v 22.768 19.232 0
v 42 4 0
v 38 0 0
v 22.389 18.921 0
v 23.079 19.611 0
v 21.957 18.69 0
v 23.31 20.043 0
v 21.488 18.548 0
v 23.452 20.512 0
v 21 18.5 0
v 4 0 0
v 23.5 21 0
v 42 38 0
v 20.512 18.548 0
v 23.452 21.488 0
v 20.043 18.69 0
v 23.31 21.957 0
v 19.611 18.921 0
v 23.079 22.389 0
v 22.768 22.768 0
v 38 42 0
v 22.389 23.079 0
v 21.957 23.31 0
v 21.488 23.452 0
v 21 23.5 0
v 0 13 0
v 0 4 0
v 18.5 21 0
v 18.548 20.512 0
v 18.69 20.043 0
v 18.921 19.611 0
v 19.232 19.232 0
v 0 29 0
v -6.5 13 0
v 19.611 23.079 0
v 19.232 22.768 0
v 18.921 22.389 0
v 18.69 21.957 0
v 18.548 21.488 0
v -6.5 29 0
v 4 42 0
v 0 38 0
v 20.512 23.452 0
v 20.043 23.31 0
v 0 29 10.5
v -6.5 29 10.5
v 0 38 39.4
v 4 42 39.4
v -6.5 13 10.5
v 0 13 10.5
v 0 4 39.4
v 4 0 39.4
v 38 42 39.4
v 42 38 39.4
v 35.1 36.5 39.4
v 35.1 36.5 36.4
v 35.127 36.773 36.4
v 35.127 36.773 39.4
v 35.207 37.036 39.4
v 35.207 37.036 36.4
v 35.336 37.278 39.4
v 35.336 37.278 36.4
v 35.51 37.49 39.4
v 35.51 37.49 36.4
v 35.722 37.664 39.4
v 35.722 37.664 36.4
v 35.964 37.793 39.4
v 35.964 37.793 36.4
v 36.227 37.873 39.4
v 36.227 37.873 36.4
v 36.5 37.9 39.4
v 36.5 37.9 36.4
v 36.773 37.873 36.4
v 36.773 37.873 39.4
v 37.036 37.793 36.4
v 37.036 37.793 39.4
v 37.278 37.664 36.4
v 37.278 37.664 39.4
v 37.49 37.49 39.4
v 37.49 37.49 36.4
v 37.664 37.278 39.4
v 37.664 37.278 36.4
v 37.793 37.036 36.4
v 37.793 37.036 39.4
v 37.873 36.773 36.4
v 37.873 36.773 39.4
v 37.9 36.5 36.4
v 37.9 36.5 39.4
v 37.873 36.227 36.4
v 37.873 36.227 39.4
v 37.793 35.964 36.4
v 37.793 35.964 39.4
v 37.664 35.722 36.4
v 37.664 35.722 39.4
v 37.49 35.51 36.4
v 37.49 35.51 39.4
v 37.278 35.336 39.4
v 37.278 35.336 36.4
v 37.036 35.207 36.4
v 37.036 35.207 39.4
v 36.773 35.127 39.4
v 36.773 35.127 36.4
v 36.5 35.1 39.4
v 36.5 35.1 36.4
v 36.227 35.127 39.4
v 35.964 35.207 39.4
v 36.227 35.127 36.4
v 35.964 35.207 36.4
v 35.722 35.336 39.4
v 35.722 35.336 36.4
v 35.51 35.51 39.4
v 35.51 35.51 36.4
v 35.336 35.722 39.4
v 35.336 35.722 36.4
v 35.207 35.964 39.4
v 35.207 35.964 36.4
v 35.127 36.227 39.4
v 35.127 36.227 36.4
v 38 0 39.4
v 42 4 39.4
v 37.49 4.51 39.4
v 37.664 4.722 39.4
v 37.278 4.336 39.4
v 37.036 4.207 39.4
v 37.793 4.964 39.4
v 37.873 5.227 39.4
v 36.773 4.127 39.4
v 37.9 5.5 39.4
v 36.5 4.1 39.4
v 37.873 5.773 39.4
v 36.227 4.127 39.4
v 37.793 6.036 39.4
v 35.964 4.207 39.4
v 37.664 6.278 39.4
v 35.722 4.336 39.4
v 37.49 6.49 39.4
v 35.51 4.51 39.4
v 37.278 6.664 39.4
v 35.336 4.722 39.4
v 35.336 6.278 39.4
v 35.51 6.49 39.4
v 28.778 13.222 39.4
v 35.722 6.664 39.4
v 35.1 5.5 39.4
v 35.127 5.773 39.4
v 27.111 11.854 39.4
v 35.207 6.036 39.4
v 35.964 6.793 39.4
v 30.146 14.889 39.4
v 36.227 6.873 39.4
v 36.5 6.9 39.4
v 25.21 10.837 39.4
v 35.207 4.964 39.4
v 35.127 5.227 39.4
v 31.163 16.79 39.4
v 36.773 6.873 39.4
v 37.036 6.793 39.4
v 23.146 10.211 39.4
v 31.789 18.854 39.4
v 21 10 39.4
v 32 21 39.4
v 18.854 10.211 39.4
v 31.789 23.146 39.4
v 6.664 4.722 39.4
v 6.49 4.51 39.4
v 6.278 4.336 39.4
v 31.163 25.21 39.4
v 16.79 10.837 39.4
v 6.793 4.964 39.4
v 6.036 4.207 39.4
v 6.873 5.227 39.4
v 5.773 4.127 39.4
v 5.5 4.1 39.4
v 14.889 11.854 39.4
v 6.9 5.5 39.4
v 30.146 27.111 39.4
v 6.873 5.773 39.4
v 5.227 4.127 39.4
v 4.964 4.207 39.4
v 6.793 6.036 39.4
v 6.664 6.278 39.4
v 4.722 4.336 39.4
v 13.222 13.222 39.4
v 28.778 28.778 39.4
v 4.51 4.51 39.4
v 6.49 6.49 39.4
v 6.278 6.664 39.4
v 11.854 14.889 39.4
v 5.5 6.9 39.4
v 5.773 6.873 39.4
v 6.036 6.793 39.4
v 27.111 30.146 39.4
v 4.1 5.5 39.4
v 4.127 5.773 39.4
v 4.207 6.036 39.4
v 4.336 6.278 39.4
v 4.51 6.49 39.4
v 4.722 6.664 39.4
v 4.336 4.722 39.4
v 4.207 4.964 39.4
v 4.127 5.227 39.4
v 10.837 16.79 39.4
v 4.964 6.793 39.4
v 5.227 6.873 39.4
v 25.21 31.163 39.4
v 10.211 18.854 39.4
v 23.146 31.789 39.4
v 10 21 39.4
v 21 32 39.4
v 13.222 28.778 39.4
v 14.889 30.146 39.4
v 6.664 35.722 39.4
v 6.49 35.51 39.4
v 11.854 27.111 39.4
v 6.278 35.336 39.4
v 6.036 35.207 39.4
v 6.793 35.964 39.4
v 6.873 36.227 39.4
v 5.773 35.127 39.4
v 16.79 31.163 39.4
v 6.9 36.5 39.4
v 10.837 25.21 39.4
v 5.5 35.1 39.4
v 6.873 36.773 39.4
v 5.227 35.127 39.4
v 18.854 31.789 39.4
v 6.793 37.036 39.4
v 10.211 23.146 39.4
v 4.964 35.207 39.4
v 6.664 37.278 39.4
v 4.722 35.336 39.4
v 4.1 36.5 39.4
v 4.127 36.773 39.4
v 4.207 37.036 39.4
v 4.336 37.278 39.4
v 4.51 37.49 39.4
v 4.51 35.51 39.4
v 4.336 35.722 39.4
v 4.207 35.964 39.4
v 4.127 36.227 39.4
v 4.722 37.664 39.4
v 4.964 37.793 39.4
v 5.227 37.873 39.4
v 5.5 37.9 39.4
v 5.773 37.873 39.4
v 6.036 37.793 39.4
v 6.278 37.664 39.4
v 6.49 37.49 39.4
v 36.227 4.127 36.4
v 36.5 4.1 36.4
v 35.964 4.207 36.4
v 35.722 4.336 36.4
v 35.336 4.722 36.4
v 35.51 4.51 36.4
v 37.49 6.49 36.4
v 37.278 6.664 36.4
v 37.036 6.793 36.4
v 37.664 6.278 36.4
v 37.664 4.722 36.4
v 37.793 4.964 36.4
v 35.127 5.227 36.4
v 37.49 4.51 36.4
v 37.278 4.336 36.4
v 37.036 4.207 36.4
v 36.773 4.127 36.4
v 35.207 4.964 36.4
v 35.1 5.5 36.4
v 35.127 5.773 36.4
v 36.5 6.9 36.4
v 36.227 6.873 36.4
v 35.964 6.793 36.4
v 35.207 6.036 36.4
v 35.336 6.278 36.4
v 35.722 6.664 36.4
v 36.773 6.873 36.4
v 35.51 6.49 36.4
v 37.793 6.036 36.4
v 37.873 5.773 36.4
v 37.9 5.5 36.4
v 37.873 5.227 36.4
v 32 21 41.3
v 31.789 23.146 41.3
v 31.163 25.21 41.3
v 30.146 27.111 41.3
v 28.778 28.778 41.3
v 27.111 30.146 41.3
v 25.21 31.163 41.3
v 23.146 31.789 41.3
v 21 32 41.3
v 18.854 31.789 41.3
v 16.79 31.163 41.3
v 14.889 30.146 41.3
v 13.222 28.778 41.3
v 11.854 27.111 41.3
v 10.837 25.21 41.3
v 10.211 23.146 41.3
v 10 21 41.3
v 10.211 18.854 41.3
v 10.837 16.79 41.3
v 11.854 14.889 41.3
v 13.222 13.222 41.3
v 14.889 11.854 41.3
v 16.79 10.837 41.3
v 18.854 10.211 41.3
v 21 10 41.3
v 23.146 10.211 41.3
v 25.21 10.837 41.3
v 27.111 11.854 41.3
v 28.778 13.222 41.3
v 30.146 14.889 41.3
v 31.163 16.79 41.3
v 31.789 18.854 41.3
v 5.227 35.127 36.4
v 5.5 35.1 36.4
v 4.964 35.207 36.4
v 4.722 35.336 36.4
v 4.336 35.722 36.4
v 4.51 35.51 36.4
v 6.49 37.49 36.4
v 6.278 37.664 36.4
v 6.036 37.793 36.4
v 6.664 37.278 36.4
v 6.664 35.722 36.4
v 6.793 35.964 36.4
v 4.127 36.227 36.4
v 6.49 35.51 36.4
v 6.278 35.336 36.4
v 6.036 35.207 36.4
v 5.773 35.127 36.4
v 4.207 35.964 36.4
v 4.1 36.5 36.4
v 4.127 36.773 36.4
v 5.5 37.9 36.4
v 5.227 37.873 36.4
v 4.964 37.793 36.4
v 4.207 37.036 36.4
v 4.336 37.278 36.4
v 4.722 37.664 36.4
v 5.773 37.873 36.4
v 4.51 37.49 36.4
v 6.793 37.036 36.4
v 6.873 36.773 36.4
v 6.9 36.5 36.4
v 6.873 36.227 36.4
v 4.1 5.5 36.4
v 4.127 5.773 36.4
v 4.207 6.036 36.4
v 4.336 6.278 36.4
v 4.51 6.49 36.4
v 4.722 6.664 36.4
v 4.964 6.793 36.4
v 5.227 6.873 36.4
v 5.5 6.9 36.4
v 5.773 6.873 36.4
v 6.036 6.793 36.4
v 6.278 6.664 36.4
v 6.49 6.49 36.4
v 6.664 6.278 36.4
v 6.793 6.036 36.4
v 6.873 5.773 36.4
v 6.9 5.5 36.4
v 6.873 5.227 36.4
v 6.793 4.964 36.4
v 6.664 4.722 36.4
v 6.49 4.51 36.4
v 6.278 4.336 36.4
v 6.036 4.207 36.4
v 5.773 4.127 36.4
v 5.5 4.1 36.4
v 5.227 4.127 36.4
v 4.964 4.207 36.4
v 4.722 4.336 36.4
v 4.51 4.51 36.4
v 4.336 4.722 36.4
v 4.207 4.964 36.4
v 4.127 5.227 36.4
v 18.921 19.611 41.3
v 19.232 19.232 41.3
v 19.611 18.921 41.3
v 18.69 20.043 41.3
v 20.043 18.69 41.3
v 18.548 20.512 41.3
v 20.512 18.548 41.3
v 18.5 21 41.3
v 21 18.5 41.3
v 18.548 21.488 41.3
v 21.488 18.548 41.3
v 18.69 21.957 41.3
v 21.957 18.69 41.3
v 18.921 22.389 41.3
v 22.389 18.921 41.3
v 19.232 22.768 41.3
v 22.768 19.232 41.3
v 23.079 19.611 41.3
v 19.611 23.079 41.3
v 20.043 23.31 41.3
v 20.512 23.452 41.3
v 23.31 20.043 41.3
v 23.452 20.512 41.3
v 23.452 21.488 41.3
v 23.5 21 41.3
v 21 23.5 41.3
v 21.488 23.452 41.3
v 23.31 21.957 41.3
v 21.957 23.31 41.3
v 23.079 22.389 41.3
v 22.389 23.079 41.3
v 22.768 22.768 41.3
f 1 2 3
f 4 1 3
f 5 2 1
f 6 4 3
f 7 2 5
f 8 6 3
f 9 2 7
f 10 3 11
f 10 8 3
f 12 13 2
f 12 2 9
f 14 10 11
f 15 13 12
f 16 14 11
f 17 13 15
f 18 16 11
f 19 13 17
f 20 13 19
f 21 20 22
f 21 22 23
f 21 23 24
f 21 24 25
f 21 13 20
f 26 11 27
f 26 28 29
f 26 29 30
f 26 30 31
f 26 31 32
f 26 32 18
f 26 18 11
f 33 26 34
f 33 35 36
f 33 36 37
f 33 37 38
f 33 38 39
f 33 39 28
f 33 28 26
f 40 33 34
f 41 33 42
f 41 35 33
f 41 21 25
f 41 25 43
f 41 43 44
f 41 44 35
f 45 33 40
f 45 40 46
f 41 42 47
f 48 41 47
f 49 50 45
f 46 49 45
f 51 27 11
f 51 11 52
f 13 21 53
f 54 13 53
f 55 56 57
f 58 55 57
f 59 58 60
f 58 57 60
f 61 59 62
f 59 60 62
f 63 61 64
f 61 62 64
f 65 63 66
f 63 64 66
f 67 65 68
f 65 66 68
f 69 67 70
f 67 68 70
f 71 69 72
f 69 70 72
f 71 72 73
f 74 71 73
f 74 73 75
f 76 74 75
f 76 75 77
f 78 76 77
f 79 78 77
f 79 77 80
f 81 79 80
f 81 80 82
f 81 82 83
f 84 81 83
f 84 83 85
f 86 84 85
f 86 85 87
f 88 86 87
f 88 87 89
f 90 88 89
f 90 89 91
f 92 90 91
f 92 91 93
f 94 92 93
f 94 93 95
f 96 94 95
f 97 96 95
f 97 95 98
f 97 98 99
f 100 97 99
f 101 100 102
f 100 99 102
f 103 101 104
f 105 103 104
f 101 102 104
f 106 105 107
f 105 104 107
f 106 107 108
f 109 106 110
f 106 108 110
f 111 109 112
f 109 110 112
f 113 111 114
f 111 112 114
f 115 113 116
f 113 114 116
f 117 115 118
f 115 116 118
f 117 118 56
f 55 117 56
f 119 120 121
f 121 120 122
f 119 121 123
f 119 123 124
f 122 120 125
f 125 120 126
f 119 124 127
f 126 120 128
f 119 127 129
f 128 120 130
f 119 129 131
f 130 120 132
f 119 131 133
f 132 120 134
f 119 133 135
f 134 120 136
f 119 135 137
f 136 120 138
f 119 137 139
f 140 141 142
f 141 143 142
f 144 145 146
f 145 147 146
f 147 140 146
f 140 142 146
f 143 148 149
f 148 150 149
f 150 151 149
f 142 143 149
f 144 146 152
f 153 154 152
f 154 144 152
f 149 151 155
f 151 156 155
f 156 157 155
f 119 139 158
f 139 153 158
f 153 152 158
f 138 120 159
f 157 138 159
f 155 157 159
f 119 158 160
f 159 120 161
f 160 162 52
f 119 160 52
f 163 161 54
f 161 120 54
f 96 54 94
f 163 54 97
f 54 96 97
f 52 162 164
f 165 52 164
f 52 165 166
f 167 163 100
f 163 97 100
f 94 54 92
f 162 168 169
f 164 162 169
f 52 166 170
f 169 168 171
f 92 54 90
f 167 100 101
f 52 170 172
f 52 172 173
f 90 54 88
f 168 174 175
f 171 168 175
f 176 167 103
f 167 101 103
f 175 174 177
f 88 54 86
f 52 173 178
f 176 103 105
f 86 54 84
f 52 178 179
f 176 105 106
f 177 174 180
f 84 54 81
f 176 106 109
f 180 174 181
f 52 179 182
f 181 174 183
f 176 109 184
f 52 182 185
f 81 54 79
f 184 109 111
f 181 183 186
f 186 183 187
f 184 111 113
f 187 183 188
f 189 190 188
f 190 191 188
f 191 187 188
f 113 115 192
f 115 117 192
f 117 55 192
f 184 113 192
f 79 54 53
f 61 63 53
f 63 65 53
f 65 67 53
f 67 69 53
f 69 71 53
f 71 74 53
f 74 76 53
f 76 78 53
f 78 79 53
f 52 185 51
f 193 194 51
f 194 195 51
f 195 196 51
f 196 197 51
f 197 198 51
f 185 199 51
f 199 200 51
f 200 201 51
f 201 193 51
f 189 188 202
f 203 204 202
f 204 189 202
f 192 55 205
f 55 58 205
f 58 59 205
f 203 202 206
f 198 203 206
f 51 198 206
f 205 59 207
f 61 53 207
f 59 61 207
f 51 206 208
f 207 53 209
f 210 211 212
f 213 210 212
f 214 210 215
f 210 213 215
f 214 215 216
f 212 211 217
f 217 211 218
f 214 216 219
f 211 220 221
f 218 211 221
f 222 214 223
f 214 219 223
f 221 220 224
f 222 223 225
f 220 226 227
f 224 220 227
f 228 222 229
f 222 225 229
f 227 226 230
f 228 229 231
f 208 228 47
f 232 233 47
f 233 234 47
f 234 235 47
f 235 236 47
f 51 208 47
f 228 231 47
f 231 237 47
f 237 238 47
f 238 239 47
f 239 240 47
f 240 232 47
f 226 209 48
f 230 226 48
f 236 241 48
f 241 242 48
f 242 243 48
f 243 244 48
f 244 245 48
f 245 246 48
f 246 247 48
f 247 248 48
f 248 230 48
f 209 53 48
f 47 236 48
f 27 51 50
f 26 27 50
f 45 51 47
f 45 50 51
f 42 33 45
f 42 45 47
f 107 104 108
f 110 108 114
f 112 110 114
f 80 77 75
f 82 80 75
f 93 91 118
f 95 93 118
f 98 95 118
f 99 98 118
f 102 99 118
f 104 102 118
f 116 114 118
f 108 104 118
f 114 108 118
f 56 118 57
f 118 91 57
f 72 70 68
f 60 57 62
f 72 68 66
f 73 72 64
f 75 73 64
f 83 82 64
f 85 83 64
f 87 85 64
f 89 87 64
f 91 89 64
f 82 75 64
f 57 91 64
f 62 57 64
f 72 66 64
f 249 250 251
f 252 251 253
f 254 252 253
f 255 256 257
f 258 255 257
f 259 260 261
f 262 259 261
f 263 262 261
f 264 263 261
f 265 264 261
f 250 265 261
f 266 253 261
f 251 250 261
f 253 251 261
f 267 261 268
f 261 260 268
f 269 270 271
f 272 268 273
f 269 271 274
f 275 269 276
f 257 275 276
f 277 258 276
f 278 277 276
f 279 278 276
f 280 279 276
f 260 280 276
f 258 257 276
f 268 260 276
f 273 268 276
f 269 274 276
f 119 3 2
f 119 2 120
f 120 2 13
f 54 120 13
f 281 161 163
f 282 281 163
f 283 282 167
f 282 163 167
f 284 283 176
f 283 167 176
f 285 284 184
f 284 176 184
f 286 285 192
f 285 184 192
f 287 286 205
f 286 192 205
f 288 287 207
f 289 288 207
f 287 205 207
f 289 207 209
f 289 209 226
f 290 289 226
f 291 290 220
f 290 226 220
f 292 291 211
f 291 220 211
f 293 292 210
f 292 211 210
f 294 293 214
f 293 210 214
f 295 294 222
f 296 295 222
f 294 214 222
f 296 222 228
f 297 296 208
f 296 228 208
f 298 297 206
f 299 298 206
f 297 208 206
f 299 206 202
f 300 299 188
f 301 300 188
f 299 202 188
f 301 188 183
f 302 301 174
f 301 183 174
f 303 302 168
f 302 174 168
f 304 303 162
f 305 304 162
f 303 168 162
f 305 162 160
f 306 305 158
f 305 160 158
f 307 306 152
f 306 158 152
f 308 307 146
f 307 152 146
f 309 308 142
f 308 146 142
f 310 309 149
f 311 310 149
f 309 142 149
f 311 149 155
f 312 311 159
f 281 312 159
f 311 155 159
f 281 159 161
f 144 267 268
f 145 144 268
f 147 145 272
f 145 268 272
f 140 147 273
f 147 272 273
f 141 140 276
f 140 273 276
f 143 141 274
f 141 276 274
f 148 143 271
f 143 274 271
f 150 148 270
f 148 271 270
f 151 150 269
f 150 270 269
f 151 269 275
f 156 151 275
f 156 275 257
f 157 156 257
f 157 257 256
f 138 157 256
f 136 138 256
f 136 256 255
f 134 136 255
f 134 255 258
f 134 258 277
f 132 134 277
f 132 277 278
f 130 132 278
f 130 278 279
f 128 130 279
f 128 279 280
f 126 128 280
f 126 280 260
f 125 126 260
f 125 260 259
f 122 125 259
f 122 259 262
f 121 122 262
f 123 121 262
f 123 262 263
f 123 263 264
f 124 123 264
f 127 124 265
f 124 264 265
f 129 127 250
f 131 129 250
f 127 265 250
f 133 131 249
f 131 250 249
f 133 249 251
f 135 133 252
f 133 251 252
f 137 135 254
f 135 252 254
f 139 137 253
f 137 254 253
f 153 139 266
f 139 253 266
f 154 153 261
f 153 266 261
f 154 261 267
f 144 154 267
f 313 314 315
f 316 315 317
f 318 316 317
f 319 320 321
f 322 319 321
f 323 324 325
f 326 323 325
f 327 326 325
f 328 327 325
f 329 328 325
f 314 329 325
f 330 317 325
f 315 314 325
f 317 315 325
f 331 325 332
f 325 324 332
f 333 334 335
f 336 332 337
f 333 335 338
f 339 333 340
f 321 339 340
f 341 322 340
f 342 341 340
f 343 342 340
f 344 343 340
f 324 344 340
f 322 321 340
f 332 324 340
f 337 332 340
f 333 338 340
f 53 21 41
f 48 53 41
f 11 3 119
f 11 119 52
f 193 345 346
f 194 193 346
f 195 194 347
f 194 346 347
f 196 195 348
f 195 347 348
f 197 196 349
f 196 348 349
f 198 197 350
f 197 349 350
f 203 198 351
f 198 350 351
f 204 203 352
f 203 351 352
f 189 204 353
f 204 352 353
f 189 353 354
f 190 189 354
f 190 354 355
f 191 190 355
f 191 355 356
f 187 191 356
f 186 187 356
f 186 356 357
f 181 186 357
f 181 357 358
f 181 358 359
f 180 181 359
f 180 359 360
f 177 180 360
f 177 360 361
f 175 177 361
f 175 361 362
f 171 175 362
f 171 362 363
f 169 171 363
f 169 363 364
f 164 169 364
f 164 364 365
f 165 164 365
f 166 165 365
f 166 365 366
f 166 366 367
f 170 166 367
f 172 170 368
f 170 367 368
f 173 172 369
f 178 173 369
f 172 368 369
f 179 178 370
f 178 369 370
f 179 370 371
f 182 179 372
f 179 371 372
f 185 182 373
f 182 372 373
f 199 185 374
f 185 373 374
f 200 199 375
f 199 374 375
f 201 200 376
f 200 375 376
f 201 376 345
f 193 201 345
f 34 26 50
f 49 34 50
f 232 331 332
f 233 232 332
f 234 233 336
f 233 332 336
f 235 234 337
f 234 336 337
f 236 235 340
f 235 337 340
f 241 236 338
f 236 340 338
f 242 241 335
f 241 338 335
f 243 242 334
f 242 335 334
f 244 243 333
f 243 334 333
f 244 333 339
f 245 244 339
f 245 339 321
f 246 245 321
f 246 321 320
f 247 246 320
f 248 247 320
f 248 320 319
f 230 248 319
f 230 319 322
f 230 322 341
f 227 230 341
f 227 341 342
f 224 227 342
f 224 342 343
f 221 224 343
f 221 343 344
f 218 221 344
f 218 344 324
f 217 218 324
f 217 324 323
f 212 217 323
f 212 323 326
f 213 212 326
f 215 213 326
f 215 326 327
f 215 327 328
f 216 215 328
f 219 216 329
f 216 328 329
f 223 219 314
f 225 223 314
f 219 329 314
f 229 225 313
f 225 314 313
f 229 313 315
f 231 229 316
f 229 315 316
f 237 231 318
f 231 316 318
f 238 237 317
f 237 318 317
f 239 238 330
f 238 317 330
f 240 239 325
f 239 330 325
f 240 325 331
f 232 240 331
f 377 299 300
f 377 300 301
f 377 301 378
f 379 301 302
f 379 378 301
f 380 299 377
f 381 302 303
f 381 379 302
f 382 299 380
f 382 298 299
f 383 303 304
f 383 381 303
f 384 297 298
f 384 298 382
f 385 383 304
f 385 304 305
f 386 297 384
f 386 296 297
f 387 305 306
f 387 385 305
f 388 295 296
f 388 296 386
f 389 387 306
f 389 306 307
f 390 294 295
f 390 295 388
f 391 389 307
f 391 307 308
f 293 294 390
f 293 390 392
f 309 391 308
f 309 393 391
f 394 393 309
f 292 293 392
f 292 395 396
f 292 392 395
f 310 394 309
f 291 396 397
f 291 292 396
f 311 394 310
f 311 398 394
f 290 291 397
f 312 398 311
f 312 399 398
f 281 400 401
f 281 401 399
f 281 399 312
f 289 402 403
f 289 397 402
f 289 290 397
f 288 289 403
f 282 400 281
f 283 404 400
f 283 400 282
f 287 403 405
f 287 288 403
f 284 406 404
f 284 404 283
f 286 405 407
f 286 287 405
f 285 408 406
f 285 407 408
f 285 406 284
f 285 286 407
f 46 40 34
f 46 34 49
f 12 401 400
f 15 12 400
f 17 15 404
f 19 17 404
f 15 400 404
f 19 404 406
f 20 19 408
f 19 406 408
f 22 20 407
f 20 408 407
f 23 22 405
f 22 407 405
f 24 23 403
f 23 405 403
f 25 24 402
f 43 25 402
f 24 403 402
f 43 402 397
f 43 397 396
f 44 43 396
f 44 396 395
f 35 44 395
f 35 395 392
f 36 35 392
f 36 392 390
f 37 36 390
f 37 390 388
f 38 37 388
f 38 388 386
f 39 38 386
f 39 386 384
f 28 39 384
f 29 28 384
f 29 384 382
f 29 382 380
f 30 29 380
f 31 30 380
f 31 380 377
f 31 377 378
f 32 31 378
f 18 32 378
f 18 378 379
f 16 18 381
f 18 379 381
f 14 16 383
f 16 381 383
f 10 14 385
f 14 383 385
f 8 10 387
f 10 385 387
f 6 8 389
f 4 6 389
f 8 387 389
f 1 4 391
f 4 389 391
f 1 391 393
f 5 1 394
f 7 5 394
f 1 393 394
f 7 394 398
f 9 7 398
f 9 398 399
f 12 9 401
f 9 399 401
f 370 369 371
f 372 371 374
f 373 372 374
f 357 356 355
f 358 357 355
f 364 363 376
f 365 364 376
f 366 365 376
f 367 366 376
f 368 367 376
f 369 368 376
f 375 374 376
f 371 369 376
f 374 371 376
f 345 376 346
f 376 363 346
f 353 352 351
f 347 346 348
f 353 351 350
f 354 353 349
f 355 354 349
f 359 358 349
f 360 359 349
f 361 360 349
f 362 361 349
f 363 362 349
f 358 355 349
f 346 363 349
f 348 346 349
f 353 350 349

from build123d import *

# Parameters (mm, degrees)
CROQUIS1_W                          = 42
CROQUIS1_H                          = 42
SALIENTE_EXTRUIR1_DEPTH             = 39.4
CROQUIS2_W                          = 10.5
CROQUIS2_H                          = 16
SALIENTE_EXTRUIR2_DEPTH             = 6.5
CROQUIS3_R                          = 11
SALIENTE_EXTRUIR3_DEPTH             = 1.9
CROQUIS4_R                          = 2.45
SALIENTE_EXTRUIR4_DEPTH             = 20.4
CORTAR_EXTRUIR1_DEPTH               = 15
DI_METRO_DE_TALADRO_2_8_2_8_1_D     = 2.8
DI_METRO_DE_TALADRO_2_8_2_8_1_DEPTH = 3
CHAFL_N1_SIZE                       = 4
CROQUIS8_R                          = 2.5
CORTAR_EXTRUIR2_DEPTH               = 62.7


with BuildPart() as part:
    # Croquis1 → Saliente-Extruir1 (new body)
    with BuildSketch(Plane(origin=(0, 0, 0), x_dir=(-1, 0, 0), z_dir=(0, 0, -1))):
        with Locations((-21, 21)):
            Rectangle(CROQUIS1_W, CROQUIS1_H)
    extrude(amount=-SALIENTE_EXTRUIR1_DEPTH)

    # Croquis2 → Saliente-Extruir2 (add)
    with BuildSketch(Plane.ZY):
        with Locations((5.25, 21)):
            Rectangle(CROQUIS2_W, CROQUIS2_H)
    extrude(amount=SALIENTE_EXTRUIR2_DEPTH)

    # Croquis3 → Saliente-Extruir3 (add)
    with BuildSketch(Plane.XY.offset(39.4)):
        with Locations((21, 21)):
            Circle(CROQUIS3_R)
    extrude(amount=SALIENTE_EXTRUIR3_DEPTH)

    # Croquis4 → Saliente-Extruir4 (add)
    with BuildSketch(Plane.XY.offset(41.3)):
        with Locations((21, 21)):
            Circle(CROQUIS4_R)
    extrude(amount=SALIENTE_EXTRUIR4_DEPTH)

    # Croquis5 → Cortar-Extruir1 (cut)
    with BuildSketch(Plane.XY.offset(61.7)):
        with BuildLine():
            Line((22.99, 22.429125607), (22.99, 19.570874393))
            ThreePointArc((22.99, 19.570874393), (23.45, 21), (22.99, 22.429125607))
        make_face()
    extrude(amount=-CORTAR_EXTRUIR1_DEPTH, mode=Mode.SUBTRACT)

    # Diámetro de taladro Ø2.8 (2.8)1
    with Locations(Plane.XY.offset(39.4)):
        with Locations((36.5, 5.5), (5.5, 5.5), (36.5, 36.5), (5.5, 36.5)):
            Hole(DI_METRO_DE_TALADRO_2_8_2_8_1_D / 2, depth=DI_METRO_DE_TALADRO_2_8_2_8_1_DEPTH)

    # Chaflán1
    chafl_n1_edges = [part.edges().sort_by_distance(p)[0] for p in [
        (42, 0, 19.7),
        (42, 42, 19.7),
        (0, 42, 19.7),
        (0, 0, 19.7),
    ]]
    chamfer(chafl_n1_edges, length=CHAFL_N1_SIZE)

    # Croquis8 → Cortar-Extruir2 (cut, through all)
    with BuildSketch(Plane.XY.offset(61.7)):
        with Locations((21, 21)):
            Circle(CROQUIS8_R)
    extrude(amount=-CORTAR_EXTRUIR2_DEPTH, mode=Mode.SUBTRACT)


solid = part.part
